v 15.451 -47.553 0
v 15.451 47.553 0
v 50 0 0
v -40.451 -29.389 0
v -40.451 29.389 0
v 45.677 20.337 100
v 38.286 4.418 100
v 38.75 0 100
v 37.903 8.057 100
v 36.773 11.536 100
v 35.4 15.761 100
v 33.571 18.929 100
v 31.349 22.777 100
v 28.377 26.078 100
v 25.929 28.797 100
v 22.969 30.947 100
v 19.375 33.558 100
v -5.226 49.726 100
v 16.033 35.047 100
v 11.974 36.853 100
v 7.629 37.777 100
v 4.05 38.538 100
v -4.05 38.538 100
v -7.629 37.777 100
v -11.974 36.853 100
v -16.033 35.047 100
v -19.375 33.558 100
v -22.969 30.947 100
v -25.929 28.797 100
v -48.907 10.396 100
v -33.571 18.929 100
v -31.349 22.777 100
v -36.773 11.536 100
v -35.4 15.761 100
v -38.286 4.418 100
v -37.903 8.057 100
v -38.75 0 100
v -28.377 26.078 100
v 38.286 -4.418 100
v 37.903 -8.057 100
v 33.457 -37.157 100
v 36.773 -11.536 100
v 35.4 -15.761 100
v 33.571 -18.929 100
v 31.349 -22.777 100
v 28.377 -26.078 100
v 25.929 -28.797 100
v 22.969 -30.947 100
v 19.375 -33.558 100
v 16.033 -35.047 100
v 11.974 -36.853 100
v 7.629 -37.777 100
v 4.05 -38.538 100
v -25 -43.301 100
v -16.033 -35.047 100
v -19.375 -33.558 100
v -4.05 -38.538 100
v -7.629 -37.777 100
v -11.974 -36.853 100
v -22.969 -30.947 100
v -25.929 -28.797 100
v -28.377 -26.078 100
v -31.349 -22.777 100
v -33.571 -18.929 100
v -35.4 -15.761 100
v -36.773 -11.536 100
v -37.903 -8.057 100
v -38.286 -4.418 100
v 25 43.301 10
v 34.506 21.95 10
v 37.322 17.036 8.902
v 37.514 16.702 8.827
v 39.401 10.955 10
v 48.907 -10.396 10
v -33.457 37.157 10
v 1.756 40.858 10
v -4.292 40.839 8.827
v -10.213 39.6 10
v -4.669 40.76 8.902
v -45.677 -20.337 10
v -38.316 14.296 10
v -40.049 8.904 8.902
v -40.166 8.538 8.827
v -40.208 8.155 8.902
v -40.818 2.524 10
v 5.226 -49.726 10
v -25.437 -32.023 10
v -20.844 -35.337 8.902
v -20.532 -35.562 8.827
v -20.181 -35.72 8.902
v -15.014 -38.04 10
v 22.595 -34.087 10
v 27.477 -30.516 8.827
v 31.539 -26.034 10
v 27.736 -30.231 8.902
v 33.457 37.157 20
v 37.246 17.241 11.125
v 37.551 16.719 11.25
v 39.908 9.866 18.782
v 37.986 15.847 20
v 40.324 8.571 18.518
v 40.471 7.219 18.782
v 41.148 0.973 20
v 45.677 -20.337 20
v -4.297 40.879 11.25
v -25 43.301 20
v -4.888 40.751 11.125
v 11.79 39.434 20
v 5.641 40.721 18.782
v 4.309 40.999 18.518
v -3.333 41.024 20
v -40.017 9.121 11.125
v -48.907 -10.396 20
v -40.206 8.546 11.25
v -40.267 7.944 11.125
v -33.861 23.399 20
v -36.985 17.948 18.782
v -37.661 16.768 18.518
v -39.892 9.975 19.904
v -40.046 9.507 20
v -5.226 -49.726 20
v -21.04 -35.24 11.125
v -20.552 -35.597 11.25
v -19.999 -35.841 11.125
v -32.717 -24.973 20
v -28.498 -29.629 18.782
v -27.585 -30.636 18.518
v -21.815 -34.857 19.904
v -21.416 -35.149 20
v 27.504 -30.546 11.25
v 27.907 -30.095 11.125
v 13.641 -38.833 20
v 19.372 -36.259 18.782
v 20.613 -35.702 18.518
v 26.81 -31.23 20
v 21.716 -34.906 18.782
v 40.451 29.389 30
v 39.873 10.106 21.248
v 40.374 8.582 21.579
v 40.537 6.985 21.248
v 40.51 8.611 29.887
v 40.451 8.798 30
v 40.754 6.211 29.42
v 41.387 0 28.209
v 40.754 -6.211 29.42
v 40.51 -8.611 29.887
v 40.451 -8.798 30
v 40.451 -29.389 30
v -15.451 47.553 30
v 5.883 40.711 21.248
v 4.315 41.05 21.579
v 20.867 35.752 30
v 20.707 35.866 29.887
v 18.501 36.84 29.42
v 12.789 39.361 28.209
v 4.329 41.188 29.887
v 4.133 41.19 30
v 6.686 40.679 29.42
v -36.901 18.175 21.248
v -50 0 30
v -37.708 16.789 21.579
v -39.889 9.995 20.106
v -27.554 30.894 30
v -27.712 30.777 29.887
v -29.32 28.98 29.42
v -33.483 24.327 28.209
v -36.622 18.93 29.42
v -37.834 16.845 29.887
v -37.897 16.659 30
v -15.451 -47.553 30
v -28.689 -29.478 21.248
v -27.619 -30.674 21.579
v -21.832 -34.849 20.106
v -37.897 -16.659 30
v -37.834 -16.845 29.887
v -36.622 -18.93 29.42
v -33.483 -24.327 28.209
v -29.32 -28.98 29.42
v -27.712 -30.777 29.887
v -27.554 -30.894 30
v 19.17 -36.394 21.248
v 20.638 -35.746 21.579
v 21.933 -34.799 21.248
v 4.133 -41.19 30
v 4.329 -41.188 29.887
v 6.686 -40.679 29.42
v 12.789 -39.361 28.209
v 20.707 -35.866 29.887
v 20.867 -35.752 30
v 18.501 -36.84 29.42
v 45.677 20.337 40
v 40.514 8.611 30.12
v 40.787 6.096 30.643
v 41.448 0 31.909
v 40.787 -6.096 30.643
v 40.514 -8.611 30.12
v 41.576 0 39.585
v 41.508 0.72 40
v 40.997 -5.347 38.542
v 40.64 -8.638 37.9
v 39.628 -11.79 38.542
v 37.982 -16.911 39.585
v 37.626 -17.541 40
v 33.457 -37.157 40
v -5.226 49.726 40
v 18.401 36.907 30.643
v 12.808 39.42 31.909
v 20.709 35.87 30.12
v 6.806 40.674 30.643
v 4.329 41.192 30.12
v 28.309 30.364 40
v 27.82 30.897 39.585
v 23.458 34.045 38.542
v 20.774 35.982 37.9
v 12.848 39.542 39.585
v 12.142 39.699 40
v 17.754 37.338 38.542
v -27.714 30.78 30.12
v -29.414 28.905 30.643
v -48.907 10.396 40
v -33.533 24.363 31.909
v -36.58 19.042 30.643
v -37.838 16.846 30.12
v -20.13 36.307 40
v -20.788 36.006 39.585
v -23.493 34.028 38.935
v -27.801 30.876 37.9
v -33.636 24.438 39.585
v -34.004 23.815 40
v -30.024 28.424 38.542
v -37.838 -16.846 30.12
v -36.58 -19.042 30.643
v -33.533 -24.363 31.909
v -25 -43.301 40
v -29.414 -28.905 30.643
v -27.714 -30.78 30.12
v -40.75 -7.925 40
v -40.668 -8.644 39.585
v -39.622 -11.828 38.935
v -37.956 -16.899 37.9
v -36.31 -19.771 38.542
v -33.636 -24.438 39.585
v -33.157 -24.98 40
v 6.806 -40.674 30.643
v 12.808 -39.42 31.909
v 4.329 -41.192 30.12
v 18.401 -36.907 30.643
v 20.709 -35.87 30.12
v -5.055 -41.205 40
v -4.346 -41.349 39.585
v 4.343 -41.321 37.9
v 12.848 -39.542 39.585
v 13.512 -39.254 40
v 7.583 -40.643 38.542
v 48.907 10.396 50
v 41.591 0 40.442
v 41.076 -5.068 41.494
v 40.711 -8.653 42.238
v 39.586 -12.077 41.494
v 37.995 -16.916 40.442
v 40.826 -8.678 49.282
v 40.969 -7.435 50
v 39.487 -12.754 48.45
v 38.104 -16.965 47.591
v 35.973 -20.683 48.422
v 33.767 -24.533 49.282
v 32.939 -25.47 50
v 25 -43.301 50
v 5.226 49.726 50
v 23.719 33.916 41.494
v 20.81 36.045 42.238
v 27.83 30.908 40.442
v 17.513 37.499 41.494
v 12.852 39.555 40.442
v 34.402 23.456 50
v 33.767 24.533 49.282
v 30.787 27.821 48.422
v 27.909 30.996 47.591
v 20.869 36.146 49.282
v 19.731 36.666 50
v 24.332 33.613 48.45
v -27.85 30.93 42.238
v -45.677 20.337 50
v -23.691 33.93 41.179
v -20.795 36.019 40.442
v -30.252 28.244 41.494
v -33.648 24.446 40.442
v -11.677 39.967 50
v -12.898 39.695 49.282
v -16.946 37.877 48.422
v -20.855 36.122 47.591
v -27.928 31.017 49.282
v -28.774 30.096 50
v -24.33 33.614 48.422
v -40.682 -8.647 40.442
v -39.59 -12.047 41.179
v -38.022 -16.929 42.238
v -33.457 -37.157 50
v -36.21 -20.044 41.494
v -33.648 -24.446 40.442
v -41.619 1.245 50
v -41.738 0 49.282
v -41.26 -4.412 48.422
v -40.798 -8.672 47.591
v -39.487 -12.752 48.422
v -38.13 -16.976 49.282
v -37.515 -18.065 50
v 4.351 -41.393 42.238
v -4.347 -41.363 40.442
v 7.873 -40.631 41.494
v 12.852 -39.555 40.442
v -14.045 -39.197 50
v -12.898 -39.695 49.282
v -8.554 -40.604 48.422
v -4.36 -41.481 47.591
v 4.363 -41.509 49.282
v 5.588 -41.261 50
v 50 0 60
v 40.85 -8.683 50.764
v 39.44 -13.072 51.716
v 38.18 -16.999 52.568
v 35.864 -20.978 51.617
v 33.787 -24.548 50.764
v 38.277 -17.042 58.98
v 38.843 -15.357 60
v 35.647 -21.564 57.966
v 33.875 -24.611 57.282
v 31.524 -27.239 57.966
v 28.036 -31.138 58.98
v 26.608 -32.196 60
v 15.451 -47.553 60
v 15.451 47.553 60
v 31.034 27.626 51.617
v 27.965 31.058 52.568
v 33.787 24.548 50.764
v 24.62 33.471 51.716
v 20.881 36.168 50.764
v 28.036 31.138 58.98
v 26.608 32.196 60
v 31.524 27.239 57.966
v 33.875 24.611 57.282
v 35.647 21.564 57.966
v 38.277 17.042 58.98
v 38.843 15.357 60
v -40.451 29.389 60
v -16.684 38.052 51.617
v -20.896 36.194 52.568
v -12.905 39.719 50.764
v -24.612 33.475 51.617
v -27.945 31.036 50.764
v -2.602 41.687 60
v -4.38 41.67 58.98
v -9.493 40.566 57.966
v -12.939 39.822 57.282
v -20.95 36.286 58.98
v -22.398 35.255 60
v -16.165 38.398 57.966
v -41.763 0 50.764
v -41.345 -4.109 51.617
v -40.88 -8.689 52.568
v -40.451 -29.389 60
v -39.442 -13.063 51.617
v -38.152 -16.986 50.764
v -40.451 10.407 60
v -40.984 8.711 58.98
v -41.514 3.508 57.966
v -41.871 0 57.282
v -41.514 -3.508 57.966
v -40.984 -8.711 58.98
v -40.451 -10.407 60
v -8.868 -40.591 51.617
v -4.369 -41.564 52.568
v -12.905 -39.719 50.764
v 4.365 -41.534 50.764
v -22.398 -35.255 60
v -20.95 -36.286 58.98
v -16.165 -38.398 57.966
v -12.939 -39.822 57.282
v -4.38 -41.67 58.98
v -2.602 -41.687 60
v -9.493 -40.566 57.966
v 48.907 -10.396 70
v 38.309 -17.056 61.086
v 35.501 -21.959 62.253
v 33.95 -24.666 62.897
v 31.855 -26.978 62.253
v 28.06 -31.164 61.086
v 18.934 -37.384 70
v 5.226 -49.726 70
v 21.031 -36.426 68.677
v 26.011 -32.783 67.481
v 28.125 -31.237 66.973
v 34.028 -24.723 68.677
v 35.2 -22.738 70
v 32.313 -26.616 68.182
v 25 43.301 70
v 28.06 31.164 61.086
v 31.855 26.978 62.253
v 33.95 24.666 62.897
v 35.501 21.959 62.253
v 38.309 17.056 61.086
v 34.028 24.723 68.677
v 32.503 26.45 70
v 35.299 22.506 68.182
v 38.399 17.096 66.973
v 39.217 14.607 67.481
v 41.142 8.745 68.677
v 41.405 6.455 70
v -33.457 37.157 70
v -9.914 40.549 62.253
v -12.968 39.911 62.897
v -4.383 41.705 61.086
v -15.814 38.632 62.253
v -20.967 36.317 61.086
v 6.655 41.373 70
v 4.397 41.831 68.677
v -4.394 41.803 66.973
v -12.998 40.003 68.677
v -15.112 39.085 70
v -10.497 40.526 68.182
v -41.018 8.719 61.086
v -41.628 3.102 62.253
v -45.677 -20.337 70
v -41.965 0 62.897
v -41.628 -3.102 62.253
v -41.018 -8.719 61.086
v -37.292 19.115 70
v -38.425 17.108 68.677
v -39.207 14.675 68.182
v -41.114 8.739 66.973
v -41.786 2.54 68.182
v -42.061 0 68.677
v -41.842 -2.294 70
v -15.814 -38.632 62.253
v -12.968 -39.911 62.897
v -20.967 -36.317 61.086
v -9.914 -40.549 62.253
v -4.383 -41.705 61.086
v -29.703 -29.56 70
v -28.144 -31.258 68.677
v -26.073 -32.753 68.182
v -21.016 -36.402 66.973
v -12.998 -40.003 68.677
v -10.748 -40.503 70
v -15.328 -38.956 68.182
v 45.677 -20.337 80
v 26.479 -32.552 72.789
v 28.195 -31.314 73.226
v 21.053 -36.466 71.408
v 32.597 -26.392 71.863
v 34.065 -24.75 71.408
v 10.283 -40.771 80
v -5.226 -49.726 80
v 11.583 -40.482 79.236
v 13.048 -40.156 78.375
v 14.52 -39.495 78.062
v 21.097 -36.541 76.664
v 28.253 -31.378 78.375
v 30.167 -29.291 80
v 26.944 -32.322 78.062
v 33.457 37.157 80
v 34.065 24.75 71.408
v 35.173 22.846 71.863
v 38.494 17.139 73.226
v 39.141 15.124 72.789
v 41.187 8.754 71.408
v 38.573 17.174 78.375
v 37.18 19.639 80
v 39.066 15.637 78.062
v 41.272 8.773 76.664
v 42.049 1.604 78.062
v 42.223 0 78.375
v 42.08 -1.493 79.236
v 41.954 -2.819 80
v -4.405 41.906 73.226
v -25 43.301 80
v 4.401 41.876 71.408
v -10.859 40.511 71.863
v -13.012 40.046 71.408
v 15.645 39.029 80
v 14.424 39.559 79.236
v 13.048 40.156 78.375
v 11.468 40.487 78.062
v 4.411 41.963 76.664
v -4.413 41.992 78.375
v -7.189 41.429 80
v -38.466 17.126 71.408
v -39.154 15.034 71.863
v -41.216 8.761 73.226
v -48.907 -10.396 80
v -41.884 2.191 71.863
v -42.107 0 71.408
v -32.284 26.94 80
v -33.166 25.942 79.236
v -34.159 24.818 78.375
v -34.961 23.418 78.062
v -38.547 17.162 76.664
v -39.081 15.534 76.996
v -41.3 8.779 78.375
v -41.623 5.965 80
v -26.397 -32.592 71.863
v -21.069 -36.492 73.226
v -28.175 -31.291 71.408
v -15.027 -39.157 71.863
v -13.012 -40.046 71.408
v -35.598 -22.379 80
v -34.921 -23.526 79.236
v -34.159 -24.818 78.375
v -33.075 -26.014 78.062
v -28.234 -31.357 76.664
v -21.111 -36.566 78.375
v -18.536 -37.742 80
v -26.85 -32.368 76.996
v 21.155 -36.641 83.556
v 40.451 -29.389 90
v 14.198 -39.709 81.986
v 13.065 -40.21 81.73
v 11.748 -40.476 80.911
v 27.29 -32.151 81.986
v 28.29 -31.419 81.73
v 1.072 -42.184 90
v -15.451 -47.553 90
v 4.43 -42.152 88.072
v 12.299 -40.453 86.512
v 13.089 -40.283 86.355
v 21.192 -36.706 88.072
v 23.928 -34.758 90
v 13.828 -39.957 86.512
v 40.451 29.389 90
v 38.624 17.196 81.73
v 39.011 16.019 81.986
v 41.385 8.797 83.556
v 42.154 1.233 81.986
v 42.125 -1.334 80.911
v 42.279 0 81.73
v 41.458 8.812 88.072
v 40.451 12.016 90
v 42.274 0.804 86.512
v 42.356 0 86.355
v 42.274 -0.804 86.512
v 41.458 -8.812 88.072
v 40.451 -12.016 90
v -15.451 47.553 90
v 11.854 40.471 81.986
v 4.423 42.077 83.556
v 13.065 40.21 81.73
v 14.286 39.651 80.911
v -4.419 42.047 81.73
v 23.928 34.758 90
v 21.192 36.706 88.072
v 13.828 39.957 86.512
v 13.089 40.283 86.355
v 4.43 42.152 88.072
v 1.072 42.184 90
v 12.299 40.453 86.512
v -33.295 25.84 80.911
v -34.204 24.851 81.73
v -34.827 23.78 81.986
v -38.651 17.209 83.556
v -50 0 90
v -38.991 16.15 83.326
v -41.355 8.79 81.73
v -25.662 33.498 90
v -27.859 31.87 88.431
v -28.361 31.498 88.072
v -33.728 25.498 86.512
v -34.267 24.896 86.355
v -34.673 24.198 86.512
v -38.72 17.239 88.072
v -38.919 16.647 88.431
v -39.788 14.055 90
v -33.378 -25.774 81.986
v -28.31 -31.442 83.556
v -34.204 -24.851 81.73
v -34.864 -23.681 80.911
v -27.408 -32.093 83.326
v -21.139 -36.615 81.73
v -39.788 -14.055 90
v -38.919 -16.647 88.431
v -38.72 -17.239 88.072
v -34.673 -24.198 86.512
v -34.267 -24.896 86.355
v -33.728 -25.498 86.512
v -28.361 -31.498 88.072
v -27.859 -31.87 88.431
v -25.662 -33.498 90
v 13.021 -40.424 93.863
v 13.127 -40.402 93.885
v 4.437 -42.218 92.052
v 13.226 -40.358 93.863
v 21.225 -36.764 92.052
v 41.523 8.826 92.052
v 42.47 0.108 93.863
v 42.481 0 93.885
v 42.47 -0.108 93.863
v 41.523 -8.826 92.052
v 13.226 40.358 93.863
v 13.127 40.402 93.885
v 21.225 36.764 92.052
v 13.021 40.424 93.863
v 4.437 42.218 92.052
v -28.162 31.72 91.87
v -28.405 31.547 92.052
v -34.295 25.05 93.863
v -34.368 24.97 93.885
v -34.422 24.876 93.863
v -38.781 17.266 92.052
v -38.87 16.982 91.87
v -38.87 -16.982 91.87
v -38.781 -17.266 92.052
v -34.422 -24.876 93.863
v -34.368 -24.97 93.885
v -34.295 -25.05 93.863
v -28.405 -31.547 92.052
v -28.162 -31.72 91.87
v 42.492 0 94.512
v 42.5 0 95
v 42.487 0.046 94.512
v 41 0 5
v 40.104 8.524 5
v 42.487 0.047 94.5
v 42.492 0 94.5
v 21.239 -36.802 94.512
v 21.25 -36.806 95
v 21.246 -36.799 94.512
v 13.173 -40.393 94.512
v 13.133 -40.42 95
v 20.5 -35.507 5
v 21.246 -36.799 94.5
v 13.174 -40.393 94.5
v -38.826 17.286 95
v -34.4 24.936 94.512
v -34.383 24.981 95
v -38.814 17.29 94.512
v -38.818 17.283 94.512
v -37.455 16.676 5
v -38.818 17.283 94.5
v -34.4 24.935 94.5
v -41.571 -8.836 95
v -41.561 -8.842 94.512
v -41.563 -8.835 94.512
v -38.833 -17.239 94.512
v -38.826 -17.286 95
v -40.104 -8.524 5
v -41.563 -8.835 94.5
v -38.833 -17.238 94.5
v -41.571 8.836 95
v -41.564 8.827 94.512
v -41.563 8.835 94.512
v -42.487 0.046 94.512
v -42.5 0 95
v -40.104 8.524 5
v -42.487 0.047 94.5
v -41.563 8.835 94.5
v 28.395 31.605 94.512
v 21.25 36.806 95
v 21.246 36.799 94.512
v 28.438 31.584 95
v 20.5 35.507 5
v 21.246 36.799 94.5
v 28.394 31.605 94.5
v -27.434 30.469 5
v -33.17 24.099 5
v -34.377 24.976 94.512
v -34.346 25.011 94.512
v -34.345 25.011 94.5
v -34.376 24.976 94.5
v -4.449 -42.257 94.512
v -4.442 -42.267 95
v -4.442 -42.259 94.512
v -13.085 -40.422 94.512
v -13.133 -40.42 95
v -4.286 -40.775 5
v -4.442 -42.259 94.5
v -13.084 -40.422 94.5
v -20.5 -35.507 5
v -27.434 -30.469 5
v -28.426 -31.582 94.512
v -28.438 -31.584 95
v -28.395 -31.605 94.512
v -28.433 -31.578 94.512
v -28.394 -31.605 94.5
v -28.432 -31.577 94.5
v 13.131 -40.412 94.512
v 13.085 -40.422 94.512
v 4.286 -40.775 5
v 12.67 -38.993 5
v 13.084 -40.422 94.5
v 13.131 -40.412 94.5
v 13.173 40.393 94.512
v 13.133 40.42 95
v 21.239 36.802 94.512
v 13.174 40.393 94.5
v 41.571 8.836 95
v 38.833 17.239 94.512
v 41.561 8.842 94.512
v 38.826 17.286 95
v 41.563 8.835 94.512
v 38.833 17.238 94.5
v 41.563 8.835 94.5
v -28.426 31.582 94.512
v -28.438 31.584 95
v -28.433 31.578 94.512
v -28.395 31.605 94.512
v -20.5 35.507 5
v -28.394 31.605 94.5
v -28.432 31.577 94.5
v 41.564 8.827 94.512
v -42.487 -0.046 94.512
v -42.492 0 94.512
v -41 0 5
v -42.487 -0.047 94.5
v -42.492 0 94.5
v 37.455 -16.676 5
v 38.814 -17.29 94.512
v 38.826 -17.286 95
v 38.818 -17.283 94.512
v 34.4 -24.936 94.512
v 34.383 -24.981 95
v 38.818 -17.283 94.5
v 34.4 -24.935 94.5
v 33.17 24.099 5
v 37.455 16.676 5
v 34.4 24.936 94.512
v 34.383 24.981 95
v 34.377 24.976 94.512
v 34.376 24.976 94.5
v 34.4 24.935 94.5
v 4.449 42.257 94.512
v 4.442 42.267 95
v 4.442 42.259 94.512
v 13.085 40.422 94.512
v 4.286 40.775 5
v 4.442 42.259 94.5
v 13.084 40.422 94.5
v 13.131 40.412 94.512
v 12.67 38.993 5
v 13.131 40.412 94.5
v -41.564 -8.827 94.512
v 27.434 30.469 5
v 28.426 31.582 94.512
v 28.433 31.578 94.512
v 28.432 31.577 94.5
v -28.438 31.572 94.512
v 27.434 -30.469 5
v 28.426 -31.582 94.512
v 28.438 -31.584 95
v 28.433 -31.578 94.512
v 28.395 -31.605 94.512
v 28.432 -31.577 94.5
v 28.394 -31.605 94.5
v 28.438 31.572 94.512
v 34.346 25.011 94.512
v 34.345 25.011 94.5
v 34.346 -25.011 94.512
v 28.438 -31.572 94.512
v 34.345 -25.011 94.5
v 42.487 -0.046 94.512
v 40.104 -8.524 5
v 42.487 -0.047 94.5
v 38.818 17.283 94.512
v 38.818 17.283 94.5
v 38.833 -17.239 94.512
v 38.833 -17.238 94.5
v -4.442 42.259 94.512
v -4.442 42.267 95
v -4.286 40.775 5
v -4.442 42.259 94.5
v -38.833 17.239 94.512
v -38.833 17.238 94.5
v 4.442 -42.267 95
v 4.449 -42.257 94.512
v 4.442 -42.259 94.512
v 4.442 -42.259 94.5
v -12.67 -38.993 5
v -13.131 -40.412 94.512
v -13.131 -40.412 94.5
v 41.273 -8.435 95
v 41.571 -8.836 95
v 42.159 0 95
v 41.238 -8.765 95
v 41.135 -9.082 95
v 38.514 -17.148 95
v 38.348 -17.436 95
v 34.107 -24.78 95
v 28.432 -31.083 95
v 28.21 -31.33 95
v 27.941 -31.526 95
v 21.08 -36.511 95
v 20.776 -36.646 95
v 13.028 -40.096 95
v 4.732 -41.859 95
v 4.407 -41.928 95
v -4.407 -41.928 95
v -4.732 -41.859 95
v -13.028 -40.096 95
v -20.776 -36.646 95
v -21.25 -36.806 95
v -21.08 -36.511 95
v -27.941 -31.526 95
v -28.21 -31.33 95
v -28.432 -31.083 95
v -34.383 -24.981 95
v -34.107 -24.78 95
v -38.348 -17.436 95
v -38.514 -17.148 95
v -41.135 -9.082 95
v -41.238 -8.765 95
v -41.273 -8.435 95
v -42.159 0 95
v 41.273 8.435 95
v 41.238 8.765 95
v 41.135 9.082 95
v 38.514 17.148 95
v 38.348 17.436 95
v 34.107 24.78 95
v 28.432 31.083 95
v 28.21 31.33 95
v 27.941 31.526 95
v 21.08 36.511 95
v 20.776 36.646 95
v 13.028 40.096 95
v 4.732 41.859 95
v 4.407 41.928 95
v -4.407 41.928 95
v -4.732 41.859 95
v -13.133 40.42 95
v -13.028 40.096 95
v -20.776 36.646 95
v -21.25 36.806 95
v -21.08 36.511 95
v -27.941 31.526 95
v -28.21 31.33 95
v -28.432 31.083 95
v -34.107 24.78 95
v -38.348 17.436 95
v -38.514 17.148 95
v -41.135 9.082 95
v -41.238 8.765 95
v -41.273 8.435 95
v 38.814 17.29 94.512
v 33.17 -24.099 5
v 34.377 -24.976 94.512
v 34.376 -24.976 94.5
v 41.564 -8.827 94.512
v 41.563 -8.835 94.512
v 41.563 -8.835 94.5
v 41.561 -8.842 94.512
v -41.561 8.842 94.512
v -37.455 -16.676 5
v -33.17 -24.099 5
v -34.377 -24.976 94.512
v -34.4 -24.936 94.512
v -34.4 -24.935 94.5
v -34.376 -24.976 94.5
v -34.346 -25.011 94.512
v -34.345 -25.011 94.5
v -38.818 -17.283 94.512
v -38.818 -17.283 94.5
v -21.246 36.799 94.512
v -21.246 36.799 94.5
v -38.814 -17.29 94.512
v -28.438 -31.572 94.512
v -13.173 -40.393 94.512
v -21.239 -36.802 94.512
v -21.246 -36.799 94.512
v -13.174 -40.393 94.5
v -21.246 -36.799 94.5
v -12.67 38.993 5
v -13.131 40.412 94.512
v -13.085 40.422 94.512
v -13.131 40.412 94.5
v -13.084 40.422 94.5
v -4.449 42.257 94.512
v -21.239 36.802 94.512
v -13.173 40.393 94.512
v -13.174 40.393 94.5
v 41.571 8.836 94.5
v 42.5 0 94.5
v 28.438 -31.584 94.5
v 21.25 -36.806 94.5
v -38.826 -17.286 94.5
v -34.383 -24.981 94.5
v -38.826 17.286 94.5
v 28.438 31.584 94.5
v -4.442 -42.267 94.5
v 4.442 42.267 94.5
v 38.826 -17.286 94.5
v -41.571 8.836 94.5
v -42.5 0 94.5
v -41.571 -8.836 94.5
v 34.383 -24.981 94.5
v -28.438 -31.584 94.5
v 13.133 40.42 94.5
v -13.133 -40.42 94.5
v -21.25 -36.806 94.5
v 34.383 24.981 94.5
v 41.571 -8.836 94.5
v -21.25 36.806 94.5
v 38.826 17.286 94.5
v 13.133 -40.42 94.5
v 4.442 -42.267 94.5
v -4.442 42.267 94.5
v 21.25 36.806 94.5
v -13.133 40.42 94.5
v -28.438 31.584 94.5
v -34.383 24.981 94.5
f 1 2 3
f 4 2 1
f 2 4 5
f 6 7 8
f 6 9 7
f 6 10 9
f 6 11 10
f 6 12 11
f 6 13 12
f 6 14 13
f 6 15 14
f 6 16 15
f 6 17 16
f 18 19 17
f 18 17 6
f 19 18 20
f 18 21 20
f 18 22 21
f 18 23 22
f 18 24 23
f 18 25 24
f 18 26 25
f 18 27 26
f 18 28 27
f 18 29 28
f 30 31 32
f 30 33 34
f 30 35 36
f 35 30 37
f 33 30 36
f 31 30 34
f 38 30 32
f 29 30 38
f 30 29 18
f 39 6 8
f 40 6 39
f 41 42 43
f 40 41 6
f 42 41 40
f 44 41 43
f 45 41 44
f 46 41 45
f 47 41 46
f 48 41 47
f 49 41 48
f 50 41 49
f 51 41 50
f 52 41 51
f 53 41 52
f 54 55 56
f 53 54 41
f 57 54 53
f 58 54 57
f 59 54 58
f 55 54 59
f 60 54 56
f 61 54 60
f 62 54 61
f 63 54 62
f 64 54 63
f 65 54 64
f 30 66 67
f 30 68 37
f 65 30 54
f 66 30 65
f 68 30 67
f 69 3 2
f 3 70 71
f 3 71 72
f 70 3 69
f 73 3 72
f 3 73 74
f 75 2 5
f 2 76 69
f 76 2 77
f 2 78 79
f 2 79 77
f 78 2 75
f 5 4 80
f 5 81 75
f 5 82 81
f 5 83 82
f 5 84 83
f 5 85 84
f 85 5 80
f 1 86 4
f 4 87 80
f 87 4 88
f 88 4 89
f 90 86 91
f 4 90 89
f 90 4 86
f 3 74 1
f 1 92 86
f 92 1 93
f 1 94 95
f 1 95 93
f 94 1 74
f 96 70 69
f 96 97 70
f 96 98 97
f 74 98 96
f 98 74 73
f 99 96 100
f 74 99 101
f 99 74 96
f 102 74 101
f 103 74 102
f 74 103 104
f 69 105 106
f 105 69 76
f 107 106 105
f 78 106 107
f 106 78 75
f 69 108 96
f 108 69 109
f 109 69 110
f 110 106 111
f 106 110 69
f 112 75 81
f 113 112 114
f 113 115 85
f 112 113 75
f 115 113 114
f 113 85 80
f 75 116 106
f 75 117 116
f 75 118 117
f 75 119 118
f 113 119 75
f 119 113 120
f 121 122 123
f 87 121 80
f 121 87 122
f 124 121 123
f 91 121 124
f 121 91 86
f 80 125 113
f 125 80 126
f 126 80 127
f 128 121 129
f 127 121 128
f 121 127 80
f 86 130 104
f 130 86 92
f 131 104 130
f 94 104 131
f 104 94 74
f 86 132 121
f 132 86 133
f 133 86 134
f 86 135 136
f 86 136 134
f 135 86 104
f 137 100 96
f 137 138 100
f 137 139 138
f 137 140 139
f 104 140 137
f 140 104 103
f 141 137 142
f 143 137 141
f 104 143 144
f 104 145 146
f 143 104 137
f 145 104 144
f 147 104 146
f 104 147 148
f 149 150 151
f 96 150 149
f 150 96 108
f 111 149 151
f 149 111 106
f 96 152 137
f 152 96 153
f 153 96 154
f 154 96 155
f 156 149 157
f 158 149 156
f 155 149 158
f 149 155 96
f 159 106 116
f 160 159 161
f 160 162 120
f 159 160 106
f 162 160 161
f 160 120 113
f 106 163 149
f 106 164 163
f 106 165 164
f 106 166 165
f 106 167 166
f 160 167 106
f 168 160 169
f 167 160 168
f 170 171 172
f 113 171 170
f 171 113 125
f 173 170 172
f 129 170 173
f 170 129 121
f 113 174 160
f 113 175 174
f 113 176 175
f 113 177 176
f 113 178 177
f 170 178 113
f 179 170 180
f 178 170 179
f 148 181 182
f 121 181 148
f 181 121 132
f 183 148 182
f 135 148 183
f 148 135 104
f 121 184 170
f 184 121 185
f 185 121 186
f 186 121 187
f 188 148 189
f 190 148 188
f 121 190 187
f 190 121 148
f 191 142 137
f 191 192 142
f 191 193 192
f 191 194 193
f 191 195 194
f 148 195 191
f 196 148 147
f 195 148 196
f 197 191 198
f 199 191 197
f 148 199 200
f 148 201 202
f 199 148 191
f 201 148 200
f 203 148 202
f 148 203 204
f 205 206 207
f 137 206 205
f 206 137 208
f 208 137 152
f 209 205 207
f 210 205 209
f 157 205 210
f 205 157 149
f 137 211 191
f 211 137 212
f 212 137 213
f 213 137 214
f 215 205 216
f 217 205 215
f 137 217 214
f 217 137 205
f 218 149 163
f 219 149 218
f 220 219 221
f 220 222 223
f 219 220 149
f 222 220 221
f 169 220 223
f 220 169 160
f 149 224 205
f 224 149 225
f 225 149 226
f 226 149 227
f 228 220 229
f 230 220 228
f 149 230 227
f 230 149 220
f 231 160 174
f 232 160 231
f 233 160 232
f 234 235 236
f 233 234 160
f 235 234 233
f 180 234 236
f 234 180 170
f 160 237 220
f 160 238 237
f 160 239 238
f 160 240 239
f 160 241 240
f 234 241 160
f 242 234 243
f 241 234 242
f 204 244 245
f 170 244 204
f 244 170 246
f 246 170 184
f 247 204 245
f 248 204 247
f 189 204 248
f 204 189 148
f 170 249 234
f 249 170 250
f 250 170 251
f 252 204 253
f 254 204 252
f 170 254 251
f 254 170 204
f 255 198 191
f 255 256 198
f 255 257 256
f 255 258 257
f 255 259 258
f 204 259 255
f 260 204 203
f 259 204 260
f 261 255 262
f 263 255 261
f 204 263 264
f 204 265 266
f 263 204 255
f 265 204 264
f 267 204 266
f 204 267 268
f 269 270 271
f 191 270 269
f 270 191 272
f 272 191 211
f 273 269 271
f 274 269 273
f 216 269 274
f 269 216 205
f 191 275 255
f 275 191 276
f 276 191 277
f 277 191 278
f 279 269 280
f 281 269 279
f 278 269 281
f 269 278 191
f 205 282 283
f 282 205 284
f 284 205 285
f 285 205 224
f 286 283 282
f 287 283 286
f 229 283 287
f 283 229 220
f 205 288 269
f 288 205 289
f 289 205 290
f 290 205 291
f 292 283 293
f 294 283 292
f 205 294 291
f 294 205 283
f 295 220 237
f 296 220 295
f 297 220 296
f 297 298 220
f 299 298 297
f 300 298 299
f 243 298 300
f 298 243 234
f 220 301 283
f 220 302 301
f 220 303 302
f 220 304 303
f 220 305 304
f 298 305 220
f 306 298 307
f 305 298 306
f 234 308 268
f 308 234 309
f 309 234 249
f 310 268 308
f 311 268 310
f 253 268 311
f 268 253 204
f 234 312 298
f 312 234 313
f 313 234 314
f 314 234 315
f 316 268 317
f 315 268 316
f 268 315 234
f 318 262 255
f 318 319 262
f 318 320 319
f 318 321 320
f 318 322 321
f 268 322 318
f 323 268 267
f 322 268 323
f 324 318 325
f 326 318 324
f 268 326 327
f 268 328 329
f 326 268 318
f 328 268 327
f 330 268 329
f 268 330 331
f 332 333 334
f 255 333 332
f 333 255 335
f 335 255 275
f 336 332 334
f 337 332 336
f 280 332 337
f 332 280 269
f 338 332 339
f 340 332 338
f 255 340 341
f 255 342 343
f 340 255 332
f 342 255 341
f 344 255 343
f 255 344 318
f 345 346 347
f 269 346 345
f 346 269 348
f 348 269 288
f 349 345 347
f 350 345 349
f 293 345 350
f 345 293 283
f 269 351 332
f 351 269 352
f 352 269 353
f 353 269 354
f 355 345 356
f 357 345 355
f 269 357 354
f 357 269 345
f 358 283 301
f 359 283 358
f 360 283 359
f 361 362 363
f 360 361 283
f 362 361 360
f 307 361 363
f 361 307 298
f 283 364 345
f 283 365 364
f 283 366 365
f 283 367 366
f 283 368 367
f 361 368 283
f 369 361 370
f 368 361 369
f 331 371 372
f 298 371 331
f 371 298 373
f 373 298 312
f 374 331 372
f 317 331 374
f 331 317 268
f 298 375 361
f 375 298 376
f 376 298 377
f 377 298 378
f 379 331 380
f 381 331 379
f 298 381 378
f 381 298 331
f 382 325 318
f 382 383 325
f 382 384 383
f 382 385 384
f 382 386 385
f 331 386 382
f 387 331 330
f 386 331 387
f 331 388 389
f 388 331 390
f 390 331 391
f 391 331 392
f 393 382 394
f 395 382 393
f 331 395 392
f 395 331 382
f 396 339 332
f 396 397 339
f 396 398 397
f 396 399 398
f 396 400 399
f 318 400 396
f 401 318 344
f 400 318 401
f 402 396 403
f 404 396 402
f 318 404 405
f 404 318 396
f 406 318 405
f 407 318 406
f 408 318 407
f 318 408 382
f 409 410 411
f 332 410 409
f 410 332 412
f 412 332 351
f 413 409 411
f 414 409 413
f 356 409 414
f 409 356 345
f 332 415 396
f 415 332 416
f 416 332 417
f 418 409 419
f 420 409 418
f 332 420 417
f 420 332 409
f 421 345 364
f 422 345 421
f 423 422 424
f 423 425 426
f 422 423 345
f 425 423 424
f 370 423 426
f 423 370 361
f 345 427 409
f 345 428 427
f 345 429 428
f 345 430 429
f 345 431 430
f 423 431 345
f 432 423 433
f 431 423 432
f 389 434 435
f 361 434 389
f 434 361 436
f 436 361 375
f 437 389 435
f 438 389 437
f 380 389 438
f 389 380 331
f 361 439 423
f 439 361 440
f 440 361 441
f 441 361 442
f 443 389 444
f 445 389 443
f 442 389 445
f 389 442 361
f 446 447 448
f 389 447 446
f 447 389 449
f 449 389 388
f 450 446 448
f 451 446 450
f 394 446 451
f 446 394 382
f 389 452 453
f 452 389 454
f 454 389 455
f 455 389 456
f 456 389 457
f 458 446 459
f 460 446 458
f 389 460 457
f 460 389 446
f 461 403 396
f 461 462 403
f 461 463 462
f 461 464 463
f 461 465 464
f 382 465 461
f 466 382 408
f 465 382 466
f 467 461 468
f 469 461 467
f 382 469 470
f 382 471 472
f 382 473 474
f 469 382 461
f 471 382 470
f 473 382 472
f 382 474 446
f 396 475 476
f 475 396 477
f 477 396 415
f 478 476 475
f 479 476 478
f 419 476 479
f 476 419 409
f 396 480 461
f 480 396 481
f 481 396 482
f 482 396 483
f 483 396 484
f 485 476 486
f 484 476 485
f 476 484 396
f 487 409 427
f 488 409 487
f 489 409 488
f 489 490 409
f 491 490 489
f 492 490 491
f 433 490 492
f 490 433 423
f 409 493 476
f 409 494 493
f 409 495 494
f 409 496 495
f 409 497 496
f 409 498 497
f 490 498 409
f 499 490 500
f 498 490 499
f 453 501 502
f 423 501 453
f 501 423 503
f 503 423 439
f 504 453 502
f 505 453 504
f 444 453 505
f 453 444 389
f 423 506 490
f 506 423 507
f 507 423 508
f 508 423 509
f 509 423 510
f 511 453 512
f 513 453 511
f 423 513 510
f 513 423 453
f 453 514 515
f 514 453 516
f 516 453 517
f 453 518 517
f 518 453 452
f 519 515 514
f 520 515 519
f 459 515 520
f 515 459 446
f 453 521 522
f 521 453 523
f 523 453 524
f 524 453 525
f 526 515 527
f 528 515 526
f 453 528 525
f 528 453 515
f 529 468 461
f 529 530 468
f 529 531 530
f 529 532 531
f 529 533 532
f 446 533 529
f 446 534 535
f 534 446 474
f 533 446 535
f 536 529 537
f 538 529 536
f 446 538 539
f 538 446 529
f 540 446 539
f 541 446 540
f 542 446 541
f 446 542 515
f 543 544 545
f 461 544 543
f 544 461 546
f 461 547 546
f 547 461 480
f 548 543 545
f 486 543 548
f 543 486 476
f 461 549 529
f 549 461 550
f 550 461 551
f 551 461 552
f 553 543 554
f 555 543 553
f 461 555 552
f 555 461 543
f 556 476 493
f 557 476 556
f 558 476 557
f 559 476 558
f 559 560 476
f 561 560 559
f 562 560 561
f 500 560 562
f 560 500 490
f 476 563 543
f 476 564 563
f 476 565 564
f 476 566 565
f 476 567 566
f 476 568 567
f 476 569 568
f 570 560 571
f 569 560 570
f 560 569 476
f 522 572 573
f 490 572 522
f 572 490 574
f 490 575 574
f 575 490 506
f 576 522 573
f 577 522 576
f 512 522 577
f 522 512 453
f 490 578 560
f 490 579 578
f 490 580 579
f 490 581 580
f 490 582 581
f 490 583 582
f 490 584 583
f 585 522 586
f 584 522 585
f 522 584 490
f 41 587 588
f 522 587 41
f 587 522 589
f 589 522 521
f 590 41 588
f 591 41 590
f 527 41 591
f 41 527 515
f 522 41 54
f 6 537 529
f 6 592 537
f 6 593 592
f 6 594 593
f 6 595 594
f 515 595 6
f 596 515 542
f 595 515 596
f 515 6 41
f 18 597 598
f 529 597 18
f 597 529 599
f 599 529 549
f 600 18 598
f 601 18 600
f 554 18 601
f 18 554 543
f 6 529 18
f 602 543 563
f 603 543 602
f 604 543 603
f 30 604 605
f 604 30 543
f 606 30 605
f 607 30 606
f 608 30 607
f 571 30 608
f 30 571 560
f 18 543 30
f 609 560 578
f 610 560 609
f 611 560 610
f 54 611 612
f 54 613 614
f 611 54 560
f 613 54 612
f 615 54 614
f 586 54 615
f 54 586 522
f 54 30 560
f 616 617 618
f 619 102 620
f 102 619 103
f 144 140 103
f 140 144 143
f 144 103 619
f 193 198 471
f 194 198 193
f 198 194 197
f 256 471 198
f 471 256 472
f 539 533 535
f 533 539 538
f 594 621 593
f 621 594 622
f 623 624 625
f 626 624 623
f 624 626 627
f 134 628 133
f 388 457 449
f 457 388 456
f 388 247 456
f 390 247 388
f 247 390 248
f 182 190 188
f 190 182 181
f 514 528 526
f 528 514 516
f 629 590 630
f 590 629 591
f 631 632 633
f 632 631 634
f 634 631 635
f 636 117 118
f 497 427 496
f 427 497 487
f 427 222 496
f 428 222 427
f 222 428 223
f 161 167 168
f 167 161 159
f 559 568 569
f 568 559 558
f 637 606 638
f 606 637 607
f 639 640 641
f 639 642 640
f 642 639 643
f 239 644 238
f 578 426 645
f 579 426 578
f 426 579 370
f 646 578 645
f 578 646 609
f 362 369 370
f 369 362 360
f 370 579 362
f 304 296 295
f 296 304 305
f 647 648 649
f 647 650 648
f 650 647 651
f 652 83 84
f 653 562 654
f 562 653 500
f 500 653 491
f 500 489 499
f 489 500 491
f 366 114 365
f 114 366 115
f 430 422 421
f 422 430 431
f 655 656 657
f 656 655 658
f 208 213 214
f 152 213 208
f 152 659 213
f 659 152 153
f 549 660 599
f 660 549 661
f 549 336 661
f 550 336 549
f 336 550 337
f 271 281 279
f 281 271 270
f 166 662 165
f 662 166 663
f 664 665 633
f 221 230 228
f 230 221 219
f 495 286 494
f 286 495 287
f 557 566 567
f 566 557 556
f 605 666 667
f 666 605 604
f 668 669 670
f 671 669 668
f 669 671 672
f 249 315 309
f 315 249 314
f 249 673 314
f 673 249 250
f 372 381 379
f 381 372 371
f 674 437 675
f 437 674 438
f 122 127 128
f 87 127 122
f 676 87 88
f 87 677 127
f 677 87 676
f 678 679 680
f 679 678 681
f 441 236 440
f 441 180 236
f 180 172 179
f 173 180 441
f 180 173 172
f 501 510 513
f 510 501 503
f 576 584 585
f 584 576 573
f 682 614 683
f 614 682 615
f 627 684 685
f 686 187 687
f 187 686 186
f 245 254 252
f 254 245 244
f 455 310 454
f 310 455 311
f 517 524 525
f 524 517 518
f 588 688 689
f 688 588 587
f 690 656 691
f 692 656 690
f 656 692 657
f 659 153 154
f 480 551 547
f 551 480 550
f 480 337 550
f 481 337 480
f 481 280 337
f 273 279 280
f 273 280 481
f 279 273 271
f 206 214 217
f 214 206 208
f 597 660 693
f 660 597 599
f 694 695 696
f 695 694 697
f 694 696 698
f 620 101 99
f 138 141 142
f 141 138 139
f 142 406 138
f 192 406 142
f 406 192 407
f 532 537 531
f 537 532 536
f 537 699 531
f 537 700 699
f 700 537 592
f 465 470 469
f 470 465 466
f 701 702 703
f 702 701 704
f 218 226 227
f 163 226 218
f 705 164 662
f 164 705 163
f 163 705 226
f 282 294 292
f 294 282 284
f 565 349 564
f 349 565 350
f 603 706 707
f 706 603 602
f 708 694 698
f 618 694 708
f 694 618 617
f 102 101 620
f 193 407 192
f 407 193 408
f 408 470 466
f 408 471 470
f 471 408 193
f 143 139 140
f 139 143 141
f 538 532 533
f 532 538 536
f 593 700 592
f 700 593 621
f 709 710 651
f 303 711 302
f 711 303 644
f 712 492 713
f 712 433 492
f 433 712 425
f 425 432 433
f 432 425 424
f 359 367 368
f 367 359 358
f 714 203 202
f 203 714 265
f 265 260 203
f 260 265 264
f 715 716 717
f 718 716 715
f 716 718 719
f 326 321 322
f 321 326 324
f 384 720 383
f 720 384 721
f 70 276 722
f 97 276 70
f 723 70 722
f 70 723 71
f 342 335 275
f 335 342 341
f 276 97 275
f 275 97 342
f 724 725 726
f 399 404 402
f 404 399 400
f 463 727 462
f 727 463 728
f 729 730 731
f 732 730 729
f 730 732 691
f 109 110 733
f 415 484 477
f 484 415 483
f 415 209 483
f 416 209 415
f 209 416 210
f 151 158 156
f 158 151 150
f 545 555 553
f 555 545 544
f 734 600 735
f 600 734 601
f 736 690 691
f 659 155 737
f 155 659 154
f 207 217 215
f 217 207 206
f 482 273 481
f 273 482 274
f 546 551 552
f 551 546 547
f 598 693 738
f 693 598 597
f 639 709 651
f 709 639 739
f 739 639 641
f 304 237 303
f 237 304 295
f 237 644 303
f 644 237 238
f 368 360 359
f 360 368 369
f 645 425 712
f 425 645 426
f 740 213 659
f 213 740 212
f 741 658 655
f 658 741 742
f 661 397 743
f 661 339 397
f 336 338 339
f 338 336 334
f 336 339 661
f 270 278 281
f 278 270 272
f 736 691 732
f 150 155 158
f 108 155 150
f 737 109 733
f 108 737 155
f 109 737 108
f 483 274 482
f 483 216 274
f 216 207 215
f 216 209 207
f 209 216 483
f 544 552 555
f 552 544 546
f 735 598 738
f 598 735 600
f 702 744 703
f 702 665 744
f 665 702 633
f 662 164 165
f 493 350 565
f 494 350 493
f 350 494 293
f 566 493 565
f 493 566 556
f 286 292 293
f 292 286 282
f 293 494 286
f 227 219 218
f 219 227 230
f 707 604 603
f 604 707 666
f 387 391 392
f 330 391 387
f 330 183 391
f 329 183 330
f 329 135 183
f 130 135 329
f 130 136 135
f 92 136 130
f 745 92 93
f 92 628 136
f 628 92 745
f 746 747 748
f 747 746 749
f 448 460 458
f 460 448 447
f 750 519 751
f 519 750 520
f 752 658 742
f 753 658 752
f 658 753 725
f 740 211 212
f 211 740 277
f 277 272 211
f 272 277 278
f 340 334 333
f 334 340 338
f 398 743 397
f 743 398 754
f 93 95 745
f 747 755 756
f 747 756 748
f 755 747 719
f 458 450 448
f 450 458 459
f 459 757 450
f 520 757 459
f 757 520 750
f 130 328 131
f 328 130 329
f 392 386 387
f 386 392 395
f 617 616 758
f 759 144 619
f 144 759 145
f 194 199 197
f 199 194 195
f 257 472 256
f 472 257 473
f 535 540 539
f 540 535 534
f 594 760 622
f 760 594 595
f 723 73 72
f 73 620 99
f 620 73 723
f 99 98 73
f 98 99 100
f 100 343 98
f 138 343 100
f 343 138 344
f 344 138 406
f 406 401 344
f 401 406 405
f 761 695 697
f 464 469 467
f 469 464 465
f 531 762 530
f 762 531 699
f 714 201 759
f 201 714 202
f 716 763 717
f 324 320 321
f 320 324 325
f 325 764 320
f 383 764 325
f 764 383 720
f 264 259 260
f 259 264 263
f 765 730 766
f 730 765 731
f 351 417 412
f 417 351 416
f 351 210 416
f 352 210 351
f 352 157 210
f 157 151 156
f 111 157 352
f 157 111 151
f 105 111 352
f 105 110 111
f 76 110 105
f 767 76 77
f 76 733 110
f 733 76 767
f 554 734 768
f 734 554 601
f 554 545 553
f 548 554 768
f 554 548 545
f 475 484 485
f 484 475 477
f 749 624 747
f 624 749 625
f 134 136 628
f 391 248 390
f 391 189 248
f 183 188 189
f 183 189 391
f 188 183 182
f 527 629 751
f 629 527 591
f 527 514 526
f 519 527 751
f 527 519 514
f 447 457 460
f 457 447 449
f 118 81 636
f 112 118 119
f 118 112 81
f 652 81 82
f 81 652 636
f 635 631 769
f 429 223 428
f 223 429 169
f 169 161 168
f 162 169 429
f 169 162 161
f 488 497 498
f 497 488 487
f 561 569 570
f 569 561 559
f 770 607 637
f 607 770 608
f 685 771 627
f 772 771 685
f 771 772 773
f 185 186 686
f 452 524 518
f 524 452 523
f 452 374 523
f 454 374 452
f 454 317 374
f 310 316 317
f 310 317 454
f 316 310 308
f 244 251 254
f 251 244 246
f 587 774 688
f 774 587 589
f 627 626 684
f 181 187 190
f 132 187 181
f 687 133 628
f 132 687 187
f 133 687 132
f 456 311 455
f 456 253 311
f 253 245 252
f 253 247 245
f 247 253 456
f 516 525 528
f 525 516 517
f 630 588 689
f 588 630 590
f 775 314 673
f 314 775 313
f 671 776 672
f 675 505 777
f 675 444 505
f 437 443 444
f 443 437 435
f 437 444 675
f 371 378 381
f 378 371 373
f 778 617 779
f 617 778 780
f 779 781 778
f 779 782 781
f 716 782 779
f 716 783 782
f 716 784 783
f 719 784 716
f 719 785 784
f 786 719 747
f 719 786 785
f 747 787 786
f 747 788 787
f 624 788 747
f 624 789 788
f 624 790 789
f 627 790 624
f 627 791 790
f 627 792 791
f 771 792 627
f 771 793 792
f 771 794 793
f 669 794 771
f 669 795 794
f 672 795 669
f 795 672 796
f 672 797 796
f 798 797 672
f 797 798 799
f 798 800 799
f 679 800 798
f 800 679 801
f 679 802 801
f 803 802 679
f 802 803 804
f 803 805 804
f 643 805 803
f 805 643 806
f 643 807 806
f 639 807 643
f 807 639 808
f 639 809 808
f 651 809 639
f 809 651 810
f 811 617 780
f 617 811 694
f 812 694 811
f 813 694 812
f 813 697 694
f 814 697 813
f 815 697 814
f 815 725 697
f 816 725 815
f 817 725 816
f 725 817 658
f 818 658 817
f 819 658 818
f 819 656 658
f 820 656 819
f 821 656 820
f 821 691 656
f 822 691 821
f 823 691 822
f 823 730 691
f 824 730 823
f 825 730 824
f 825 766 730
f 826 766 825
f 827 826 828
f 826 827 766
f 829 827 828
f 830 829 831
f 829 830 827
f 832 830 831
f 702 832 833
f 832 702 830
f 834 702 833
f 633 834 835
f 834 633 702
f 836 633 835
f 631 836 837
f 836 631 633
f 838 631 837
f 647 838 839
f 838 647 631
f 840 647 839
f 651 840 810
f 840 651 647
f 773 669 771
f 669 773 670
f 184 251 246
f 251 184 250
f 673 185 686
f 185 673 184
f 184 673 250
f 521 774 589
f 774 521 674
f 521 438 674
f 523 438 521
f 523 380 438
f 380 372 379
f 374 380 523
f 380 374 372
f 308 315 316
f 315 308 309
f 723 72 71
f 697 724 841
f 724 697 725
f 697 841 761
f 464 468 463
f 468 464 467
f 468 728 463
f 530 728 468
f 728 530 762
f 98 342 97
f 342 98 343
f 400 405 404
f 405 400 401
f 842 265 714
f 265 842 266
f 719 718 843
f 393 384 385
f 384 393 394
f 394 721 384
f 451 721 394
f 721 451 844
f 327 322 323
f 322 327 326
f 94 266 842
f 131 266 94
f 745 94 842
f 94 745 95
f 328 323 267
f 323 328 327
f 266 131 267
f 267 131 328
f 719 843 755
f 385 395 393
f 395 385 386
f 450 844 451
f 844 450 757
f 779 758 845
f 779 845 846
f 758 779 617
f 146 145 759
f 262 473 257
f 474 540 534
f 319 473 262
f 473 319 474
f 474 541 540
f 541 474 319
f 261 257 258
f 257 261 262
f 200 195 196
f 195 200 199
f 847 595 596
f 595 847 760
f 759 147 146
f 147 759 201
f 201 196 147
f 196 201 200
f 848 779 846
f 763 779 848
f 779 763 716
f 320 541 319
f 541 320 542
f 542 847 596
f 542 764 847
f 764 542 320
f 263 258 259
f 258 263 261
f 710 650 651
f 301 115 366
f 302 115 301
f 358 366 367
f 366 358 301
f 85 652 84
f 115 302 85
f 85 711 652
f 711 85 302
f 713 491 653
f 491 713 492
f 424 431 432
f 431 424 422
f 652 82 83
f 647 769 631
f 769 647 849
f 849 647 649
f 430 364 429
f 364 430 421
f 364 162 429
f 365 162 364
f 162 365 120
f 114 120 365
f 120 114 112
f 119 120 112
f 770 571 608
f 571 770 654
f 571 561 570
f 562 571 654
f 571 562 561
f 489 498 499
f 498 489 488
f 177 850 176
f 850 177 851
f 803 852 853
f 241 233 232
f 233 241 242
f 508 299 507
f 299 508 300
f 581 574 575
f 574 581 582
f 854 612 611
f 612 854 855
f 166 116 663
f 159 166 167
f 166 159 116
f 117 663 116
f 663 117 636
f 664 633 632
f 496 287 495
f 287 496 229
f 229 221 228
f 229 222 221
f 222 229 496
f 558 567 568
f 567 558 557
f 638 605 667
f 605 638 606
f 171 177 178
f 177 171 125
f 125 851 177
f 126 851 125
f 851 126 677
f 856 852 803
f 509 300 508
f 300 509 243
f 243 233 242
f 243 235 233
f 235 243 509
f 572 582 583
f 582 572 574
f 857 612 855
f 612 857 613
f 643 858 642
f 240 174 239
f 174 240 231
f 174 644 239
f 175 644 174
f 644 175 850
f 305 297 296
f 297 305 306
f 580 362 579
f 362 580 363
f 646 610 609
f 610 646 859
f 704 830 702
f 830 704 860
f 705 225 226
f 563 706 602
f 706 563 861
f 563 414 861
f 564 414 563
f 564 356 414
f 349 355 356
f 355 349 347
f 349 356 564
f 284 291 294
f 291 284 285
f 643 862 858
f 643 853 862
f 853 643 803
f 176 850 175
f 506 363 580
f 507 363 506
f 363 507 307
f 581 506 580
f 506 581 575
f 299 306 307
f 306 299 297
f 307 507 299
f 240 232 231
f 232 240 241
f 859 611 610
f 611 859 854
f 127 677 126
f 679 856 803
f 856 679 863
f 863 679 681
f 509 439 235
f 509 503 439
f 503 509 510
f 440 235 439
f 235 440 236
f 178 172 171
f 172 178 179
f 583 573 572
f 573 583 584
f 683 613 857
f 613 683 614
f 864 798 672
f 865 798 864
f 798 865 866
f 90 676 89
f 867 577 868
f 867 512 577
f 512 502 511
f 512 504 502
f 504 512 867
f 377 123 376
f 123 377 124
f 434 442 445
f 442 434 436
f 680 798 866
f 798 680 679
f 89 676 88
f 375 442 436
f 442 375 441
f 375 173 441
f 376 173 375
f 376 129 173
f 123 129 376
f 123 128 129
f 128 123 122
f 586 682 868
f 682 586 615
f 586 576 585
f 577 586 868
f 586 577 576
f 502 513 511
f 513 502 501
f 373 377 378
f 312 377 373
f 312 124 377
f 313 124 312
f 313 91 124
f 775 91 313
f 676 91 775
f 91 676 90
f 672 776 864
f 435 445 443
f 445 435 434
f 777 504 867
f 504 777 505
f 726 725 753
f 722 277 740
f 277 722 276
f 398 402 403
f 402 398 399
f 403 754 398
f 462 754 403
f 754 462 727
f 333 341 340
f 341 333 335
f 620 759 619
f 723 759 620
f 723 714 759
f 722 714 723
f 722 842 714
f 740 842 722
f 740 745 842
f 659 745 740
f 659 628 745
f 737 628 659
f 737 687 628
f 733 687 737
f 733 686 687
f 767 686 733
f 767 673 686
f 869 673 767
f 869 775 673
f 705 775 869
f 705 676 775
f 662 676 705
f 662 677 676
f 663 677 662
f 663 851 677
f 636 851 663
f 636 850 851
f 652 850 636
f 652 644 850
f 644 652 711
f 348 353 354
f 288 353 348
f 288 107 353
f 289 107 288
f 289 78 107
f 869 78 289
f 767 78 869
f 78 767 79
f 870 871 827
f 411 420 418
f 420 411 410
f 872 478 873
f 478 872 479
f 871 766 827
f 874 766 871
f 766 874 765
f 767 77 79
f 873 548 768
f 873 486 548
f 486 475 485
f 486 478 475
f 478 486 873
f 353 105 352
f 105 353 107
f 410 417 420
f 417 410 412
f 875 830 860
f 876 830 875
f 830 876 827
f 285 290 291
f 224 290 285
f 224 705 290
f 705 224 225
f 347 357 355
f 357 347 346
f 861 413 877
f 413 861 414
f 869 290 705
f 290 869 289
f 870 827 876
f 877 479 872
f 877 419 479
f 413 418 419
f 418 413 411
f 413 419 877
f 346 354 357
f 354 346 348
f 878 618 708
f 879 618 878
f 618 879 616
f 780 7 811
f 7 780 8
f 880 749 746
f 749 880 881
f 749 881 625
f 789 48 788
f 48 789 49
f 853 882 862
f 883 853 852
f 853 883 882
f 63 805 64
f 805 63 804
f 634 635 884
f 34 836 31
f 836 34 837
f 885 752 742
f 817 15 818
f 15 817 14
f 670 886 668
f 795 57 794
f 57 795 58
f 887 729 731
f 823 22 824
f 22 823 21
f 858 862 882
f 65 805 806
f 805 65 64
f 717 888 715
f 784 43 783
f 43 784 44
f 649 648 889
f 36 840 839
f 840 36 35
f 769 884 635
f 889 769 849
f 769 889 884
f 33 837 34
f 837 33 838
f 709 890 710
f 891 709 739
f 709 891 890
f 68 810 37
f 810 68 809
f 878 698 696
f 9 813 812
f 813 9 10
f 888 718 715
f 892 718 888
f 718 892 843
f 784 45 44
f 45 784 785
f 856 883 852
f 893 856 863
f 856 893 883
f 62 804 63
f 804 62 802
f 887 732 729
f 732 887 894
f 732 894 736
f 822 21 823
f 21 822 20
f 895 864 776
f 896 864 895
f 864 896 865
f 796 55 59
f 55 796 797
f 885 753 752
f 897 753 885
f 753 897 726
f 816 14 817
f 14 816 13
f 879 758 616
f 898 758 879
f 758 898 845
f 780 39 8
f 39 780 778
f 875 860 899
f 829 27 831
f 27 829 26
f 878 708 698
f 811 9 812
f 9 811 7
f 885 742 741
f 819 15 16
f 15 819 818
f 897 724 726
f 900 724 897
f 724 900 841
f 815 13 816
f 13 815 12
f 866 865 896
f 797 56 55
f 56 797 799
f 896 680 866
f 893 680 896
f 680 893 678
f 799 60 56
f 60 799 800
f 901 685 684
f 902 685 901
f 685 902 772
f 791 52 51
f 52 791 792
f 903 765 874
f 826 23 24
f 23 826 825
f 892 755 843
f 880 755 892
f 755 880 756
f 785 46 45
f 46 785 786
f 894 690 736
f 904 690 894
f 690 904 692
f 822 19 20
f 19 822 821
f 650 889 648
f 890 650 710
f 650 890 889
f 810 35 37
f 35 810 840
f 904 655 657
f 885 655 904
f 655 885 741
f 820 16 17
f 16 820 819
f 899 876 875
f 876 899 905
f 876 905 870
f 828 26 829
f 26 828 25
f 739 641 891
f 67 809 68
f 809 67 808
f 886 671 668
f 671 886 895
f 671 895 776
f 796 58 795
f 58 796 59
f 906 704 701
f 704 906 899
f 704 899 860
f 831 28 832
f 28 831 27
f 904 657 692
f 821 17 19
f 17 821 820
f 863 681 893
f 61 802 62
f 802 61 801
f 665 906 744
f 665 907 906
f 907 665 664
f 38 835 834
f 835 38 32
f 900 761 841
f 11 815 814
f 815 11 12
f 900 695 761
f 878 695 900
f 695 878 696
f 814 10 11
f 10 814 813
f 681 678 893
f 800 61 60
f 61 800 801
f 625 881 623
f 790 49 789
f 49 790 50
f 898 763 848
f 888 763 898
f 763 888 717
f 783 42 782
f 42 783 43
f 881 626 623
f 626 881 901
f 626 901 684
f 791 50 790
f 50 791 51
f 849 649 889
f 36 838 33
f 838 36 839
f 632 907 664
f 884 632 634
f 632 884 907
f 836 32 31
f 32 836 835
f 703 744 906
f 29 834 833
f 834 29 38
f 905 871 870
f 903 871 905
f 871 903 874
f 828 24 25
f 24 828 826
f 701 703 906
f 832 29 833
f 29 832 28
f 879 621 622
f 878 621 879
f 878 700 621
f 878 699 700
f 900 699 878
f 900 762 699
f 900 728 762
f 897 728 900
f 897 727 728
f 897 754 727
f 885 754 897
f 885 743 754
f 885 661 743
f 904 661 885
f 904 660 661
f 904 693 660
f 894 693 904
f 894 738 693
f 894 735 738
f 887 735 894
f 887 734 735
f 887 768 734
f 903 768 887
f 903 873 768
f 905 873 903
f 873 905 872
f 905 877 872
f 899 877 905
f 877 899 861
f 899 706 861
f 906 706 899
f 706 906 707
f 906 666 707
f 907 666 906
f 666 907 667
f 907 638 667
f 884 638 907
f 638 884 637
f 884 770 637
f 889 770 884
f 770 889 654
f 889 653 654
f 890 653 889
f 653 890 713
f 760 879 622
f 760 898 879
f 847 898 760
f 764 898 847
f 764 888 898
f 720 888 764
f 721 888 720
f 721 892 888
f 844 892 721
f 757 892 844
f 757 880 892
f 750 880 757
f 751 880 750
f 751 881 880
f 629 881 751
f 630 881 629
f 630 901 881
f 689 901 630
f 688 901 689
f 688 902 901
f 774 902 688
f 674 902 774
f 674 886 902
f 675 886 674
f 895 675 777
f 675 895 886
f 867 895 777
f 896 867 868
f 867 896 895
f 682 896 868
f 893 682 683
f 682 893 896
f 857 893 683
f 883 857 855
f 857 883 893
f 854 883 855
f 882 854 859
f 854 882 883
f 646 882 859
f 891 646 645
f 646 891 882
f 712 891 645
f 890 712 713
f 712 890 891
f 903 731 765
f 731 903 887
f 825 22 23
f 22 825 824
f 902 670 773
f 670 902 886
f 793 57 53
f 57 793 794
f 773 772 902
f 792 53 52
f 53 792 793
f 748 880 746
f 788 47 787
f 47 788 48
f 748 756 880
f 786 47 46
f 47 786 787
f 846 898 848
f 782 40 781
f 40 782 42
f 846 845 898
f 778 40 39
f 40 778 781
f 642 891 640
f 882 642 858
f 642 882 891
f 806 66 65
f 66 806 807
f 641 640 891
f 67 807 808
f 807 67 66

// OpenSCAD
// polygon extrusion vases, with twists and interference patterns
//
// github.com/pchuck/generative-3d-models
//
radius = 50;
sides = 6;
height = 100;
center = true;
convexity = 10;
//twist = 120;
twist = 120;
scale = [2, 2];
fn=30;

steps = twist * fn / 360;
step_inc = height / steps;
twist_inc = twist / steps;
echo(steps);


module simple_extruded_vase(sides, twist, radius, offset, height, scale, r) {
    translate([0, 0, offset + height / 2])
        rotate(r)

        linear_extrude(height=height, 
                       center = center, 
                       convexity=convexity, 
                       twist=twist, 
                       scale=scale, 
                       $fn=fn)
            circle(r=radius, $fn=sides);
}

module complex_extruded_vase() {
union() {
    translate([0, 0, height / 2])
        linear_extrude(height=height, 
                    center = center, 
                    convexity=convexity, 
                    twist=twist, 
                    scale=scale, 
                    $fn=fn)
            circle(r=radius, $fn=sides);
    
    for(j=[0:1:steps - 1]) {
        for(i=[0:1:15]) {
            translate([0, 0, j * step_inc + step_inc / 2.5]) {
                for(r=[0:60:180]) {
                    rotate([twist_inc * (j + 1.35) + r, 90, 0])
                        cylinder(h=height * 2, r=10, center=true);
                }
            }
            
            translate([0, 0, j * step_inc + step_inc / 1.7]) {
                for(r=[35:60:180]) {
                    rotate([twist_inc * (j + 1.7) + r, 90, 0])
                        cylinder(h=height * 2, r=10, center=true);
                }
            }
            
        }
    }
}
}


// simple twisted extrusion, with constant radius
//simple_extruded_vase(5, 120, radius, 0, height, [0.5, 0.5], [0, 0, 0]);

// simple twisted extrusion, with changing radius
//simple_extruded_vase(5, 120, radius, 0, height, [1.0, 1.0], [0, 0, 0]);

// with interference patterns/holes
difference() {
    simple_extruded_vase(5, twist, radius, 0, height, [1.0, 1.0], [0, 0, 0]);

    translate([0, 0, height / 2]) 
      cylinder(h=height * (steps - 1) / steps, d1=2 * radius * 0.82, d2=2 * radius * 0.85, center=true);
    
    translate([0, 0, height])
        cylinder(h=11, d1=2*radius * 0.85, d2=2*radius * 0.7, center=true);
}

/* 
// with varying radius
simple_extruded_vase(5, 45, radius, 0, height / 2, [0.5, 0.5], [0, 0, 0]);
simple_extruded_vase(5, 30, radius * 0.5, height / 2, height / 4, [1.25, 1.25], [0, 0, 27]);
simple_extruded_vase(5, 45, radius * 0.63, height / 2 + height / 4, height / 4, [1.25, 1.25], [0, 0, -3]);
*/

/* 
// with varying, increasing radius
simple_extruded_vase(8, 60, radius, 0, height / 3, [1.25, 1.75], [0, 180, 180]);
simple_extruded_vase(8, 60, radius, height / 3, height / 3, [1.25, 1.25], [0, 0, 0]);
simple_extruded_vase(8, 60, radius * 1.25, height / 3 * 2, height / 3, [2, 1.5], [0, 0, 30]);
*/

// complex_extruded_vase();
